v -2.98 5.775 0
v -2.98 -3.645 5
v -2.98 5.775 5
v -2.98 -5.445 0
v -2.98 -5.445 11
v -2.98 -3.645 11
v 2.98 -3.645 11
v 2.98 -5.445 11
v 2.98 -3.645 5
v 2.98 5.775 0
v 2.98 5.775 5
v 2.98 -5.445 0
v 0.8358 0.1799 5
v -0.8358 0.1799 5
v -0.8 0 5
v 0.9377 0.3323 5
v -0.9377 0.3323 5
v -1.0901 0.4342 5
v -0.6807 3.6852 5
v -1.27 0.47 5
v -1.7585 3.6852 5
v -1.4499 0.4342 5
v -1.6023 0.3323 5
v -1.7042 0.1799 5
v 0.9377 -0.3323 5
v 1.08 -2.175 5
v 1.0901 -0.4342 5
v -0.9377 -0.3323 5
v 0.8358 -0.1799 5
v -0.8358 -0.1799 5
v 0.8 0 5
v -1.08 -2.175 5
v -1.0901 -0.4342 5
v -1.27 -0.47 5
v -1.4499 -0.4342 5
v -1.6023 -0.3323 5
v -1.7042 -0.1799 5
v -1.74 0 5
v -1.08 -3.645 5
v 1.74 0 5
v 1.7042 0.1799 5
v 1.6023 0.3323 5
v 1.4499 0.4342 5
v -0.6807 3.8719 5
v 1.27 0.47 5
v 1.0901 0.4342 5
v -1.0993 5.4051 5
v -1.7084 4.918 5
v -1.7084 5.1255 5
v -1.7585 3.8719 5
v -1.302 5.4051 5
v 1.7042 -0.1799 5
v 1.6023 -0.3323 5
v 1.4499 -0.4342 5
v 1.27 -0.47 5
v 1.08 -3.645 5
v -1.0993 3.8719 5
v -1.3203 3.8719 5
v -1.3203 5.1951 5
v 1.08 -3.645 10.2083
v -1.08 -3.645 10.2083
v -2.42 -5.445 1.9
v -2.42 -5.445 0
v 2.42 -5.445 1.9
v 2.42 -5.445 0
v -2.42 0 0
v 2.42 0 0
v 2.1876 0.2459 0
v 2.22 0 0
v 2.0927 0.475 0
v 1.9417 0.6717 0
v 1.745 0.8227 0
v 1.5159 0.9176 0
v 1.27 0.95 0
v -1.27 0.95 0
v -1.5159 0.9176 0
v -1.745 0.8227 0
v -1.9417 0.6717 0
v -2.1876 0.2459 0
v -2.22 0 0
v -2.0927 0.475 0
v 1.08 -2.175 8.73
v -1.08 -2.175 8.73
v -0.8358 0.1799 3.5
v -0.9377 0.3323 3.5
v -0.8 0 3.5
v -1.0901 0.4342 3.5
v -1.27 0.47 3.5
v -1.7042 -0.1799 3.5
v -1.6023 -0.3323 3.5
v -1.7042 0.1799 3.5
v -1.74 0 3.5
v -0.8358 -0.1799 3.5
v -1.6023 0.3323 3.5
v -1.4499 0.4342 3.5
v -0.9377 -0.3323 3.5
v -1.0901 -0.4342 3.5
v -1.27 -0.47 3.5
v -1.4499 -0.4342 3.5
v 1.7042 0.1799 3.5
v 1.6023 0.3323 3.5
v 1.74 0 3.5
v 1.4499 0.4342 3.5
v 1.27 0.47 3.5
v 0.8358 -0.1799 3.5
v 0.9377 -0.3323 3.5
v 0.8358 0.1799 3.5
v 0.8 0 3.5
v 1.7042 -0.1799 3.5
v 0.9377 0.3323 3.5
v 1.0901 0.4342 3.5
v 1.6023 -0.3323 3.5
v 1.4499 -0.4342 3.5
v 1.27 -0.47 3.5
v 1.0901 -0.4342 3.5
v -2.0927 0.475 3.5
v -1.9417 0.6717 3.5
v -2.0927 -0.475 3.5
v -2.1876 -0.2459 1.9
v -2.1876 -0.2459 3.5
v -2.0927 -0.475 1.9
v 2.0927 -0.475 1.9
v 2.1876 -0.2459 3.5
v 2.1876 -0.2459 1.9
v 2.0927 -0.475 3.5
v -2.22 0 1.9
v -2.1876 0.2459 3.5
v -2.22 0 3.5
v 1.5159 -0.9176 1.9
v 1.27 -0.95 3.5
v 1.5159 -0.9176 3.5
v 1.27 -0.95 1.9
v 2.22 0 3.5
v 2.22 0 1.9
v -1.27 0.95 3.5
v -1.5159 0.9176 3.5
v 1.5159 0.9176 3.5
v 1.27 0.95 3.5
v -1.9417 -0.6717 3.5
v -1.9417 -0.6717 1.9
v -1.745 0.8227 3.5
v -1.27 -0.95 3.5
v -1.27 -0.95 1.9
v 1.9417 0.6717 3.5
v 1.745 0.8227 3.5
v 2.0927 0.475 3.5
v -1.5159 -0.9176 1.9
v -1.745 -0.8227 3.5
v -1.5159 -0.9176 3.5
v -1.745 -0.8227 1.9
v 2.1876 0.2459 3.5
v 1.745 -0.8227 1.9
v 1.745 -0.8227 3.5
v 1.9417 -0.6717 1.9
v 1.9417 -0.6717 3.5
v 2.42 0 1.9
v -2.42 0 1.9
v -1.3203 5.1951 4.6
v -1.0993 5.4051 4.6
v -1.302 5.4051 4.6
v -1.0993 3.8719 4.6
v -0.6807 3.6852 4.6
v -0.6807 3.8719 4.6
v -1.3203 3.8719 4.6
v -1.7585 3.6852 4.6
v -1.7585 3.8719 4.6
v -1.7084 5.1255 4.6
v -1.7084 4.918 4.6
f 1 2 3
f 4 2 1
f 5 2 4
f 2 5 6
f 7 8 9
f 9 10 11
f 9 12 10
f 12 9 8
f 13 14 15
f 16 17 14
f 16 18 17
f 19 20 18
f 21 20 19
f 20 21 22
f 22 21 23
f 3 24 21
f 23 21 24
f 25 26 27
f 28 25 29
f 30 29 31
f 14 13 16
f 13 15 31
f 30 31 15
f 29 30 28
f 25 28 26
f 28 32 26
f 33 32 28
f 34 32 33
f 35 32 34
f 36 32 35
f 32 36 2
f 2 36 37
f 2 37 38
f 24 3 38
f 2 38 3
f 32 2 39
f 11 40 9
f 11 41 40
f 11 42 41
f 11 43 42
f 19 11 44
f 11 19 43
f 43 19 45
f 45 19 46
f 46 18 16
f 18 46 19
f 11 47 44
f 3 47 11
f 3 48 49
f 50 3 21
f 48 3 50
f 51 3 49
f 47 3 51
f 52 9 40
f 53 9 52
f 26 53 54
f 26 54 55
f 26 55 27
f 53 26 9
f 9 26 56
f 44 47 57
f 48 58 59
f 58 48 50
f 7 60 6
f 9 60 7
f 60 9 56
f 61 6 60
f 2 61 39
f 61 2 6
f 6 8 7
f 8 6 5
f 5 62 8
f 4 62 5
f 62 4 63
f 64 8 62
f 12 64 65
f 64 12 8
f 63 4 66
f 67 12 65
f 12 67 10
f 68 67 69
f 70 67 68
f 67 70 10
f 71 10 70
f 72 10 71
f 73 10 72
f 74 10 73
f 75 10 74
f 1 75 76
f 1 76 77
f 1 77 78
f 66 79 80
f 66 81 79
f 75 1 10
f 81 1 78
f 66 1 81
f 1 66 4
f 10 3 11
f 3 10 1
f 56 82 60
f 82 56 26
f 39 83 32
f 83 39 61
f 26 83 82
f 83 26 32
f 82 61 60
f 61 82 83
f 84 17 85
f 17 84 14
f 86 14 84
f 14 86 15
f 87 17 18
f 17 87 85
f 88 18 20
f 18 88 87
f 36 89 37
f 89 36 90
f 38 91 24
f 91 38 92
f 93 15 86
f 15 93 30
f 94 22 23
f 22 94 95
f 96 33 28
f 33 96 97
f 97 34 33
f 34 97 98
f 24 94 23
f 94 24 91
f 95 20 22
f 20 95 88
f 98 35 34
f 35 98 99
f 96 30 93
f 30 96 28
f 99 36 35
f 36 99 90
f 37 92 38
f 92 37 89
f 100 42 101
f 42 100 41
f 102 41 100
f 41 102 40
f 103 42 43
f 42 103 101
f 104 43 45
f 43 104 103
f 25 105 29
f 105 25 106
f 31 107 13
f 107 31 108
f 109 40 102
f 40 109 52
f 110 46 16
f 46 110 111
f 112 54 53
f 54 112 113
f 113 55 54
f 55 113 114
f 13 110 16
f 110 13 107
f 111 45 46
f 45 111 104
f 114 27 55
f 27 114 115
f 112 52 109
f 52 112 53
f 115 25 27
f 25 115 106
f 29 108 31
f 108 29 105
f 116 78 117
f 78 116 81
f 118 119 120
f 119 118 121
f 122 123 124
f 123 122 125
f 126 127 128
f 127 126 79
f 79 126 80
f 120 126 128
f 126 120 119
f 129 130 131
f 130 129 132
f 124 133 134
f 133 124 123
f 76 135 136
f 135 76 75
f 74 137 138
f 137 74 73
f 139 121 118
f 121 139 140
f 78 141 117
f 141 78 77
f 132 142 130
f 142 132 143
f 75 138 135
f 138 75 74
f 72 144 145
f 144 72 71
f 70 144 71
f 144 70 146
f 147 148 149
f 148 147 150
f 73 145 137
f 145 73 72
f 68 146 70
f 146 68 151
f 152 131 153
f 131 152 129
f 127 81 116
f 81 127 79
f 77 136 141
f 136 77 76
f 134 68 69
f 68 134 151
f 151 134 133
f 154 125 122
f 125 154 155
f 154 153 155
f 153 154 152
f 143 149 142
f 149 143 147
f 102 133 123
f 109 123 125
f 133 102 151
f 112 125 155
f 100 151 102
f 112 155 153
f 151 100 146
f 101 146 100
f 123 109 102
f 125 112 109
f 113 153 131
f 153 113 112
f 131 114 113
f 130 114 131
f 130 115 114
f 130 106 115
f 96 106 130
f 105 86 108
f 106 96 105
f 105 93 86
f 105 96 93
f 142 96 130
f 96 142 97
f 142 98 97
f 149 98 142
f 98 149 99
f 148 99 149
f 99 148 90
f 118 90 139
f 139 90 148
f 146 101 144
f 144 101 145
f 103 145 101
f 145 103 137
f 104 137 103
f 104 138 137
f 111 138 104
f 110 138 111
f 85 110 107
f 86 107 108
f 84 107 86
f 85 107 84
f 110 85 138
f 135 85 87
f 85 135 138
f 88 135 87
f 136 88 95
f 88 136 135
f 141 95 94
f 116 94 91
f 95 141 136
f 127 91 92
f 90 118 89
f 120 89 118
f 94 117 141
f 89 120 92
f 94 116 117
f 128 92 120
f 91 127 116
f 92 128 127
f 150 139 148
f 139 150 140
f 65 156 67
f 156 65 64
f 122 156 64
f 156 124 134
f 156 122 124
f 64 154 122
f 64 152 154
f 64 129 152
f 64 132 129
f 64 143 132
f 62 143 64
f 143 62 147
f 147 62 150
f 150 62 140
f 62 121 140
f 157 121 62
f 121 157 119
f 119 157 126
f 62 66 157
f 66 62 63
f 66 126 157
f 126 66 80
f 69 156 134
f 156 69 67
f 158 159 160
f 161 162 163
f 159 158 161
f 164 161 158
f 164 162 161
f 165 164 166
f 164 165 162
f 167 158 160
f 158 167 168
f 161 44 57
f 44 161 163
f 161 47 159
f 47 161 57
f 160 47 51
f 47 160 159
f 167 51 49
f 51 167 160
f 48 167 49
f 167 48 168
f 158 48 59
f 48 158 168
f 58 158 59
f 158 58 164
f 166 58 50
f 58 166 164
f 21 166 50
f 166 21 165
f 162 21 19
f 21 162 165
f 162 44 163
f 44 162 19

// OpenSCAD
// SPDX-FileCopyrightText: 2026 Alon A. Rabinowitz
// SPDX-License-Identifier: CC-BY-4.0

// The male, 2 pins, as it prints. Everything is in fan-connector.scad; this file only picks the part.
include <fan-connector.scad>
part = "male";
pins = 2;
